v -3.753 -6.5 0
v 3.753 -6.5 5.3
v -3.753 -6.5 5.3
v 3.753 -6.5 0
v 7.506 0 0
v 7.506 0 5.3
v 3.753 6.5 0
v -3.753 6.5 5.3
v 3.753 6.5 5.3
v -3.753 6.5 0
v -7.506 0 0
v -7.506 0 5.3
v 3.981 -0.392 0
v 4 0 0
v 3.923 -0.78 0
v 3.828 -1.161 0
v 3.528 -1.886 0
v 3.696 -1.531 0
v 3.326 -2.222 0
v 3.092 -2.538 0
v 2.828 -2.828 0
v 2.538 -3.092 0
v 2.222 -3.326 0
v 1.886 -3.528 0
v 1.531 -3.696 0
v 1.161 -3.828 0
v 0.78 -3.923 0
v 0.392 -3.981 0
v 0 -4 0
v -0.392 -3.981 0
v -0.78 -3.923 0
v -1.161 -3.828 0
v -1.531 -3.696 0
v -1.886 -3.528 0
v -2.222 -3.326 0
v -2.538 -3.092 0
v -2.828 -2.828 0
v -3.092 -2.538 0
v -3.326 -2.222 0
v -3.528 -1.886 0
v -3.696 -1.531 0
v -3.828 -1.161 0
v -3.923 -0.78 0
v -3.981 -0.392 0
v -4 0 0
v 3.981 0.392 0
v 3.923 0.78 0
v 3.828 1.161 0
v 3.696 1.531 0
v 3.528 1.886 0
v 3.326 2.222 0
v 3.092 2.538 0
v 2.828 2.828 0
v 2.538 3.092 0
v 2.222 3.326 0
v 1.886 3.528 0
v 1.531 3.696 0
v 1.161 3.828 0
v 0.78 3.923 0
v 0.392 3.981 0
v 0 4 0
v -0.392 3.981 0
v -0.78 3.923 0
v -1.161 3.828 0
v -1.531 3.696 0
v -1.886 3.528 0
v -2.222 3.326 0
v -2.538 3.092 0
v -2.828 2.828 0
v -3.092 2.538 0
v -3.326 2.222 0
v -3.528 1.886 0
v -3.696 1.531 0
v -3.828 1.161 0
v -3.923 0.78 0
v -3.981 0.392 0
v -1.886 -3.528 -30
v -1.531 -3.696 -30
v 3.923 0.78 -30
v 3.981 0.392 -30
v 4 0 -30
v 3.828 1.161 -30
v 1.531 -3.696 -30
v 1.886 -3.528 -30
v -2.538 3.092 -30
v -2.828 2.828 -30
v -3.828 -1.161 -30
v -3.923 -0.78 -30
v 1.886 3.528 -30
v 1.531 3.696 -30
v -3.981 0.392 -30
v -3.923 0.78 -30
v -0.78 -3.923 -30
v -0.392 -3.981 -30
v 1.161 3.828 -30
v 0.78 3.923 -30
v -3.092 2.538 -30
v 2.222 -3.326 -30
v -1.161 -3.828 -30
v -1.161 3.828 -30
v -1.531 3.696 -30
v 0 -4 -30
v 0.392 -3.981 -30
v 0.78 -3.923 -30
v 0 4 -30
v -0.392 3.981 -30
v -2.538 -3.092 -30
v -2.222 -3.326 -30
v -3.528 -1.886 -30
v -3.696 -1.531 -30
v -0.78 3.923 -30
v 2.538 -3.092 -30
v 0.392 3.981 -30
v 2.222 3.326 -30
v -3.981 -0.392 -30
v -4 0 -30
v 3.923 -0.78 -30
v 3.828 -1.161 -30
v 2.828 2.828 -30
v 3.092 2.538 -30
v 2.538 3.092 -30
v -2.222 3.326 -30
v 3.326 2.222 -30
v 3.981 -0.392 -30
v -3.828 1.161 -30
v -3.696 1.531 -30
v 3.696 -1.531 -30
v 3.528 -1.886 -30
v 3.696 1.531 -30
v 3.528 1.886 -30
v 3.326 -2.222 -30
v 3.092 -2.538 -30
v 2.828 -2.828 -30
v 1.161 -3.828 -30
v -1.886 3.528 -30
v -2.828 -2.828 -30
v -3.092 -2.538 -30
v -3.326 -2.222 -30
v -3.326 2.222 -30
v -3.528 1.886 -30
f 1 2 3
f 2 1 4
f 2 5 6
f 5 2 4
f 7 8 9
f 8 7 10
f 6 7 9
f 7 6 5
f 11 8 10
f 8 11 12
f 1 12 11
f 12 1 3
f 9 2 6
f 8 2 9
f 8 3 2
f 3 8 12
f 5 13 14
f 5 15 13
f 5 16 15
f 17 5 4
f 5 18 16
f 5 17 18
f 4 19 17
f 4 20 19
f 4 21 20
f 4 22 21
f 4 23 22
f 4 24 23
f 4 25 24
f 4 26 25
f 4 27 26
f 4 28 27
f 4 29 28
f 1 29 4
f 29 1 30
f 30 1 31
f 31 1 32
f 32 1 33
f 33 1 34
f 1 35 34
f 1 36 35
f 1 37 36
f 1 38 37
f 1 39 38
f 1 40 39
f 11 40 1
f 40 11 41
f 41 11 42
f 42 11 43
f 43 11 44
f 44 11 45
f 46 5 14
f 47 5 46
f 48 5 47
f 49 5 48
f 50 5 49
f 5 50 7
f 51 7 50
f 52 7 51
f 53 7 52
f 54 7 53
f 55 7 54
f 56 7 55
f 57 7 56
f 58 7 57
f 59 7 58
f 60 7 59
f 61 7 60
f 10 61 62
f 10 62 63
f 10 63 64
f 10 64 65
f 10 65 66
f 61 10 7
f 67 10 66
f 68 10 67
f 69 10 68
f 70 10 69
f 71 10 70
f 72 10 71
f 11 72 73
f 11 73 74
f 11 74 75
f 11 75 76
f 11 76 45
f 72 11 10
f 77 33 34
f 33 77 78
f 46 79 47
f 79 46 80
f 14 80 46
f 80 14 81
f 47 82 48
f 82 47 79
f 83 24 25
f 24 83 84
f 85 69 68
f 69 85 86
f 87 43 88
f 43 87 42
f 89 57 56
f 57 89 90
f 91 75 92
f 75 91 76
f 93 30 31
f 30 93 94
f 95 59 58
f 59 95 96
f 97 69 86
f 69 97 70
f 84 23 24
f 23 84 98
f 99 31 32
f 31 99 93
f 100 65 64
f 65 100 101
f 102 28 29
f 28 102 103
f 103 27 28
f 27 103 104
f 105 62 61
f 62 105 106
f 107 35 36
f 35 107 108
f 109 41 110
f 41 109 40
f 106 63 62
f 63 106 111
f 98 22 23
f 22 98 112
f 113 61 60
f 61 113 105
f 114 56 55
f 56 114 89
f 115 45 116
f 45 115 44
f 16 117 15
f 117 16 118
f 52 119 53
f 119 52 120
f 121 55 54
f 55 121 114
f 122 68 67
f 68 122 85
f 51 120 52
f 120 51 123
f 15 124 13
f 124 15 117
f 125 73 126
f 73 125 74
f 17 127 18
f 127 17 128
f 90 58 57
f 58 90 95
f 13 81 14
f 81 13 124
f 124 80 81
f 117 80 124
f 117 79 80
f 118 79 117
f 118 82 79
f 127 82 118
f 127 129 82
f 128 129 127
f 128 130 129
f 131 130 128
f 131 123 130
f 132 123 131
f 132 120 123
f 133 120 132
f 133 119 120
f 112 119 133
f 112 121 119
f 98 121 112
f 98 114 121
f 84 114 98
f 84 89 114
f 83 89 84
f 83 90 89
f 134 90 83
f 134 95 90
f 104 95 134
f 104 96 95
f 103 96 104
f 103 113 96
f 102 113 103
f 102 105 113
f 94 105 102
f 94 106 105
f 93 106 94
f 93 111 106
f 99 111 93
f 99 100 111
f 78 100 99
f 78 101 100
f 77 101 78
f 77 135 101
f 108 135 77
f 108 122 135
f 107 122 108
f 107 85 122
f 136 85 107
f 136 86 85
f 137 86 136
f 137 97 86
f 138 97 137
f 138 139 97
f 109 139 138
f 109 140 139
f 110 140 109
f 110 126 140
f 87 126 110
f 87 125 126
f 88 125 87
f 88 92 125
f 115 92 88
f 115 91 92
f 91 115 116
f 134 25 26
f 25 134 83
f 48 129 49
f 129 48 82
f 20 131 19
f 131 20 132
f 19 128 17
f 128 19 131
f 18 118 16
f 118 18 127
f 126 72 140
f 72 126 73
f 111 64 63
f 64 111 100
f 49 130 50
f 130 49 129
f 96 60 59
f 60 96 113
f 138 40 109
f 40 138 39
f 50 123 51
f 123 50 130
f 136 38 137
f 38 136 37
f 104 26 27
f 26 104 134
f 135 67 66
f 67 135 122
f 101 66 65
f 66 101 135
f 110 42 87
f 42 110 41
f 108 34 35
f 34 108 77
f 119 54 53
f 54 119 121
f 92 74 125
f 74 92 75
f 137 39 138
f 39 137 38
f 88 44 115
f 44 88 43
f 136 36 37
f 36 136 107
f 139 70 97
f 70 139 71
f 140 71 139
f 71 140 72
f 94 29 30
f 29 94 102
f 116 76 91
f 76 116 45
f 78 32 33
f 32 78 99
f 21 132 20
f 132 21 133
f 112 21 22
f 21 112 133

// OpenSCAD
// M8 六角ボルト (ねじ山なし)

// 頭部: 対辺距離 13mm、高さ 5.3mm
// OpenSCADのcylinder(fn=6)は「外接円半径」を引数に取るため、
// 対辺距離(S)から半径(r)を求めるには r = S / sqrt(3) もしくは r = (S/2) / cos(30°) を用いる
head_across_flats = 13;
head_height = 5.3;
shank_diameter = 8;
shank_length = 30;

// 頭部: z=0 から z=5.3 まで配置
// 直径方向の補正: 半径 = (対辺距離 / 2) / cos(30°)
cylinder(r = (head_across_flats / 2) / cos(30), h = head_height, $fn = 6);

// シャンク: z=0 から z=-30 まで配置
translate([0, 0, -shank_length])
cylinder(r = shank_diameter / 2, h = shank_length, $fn = 64);
